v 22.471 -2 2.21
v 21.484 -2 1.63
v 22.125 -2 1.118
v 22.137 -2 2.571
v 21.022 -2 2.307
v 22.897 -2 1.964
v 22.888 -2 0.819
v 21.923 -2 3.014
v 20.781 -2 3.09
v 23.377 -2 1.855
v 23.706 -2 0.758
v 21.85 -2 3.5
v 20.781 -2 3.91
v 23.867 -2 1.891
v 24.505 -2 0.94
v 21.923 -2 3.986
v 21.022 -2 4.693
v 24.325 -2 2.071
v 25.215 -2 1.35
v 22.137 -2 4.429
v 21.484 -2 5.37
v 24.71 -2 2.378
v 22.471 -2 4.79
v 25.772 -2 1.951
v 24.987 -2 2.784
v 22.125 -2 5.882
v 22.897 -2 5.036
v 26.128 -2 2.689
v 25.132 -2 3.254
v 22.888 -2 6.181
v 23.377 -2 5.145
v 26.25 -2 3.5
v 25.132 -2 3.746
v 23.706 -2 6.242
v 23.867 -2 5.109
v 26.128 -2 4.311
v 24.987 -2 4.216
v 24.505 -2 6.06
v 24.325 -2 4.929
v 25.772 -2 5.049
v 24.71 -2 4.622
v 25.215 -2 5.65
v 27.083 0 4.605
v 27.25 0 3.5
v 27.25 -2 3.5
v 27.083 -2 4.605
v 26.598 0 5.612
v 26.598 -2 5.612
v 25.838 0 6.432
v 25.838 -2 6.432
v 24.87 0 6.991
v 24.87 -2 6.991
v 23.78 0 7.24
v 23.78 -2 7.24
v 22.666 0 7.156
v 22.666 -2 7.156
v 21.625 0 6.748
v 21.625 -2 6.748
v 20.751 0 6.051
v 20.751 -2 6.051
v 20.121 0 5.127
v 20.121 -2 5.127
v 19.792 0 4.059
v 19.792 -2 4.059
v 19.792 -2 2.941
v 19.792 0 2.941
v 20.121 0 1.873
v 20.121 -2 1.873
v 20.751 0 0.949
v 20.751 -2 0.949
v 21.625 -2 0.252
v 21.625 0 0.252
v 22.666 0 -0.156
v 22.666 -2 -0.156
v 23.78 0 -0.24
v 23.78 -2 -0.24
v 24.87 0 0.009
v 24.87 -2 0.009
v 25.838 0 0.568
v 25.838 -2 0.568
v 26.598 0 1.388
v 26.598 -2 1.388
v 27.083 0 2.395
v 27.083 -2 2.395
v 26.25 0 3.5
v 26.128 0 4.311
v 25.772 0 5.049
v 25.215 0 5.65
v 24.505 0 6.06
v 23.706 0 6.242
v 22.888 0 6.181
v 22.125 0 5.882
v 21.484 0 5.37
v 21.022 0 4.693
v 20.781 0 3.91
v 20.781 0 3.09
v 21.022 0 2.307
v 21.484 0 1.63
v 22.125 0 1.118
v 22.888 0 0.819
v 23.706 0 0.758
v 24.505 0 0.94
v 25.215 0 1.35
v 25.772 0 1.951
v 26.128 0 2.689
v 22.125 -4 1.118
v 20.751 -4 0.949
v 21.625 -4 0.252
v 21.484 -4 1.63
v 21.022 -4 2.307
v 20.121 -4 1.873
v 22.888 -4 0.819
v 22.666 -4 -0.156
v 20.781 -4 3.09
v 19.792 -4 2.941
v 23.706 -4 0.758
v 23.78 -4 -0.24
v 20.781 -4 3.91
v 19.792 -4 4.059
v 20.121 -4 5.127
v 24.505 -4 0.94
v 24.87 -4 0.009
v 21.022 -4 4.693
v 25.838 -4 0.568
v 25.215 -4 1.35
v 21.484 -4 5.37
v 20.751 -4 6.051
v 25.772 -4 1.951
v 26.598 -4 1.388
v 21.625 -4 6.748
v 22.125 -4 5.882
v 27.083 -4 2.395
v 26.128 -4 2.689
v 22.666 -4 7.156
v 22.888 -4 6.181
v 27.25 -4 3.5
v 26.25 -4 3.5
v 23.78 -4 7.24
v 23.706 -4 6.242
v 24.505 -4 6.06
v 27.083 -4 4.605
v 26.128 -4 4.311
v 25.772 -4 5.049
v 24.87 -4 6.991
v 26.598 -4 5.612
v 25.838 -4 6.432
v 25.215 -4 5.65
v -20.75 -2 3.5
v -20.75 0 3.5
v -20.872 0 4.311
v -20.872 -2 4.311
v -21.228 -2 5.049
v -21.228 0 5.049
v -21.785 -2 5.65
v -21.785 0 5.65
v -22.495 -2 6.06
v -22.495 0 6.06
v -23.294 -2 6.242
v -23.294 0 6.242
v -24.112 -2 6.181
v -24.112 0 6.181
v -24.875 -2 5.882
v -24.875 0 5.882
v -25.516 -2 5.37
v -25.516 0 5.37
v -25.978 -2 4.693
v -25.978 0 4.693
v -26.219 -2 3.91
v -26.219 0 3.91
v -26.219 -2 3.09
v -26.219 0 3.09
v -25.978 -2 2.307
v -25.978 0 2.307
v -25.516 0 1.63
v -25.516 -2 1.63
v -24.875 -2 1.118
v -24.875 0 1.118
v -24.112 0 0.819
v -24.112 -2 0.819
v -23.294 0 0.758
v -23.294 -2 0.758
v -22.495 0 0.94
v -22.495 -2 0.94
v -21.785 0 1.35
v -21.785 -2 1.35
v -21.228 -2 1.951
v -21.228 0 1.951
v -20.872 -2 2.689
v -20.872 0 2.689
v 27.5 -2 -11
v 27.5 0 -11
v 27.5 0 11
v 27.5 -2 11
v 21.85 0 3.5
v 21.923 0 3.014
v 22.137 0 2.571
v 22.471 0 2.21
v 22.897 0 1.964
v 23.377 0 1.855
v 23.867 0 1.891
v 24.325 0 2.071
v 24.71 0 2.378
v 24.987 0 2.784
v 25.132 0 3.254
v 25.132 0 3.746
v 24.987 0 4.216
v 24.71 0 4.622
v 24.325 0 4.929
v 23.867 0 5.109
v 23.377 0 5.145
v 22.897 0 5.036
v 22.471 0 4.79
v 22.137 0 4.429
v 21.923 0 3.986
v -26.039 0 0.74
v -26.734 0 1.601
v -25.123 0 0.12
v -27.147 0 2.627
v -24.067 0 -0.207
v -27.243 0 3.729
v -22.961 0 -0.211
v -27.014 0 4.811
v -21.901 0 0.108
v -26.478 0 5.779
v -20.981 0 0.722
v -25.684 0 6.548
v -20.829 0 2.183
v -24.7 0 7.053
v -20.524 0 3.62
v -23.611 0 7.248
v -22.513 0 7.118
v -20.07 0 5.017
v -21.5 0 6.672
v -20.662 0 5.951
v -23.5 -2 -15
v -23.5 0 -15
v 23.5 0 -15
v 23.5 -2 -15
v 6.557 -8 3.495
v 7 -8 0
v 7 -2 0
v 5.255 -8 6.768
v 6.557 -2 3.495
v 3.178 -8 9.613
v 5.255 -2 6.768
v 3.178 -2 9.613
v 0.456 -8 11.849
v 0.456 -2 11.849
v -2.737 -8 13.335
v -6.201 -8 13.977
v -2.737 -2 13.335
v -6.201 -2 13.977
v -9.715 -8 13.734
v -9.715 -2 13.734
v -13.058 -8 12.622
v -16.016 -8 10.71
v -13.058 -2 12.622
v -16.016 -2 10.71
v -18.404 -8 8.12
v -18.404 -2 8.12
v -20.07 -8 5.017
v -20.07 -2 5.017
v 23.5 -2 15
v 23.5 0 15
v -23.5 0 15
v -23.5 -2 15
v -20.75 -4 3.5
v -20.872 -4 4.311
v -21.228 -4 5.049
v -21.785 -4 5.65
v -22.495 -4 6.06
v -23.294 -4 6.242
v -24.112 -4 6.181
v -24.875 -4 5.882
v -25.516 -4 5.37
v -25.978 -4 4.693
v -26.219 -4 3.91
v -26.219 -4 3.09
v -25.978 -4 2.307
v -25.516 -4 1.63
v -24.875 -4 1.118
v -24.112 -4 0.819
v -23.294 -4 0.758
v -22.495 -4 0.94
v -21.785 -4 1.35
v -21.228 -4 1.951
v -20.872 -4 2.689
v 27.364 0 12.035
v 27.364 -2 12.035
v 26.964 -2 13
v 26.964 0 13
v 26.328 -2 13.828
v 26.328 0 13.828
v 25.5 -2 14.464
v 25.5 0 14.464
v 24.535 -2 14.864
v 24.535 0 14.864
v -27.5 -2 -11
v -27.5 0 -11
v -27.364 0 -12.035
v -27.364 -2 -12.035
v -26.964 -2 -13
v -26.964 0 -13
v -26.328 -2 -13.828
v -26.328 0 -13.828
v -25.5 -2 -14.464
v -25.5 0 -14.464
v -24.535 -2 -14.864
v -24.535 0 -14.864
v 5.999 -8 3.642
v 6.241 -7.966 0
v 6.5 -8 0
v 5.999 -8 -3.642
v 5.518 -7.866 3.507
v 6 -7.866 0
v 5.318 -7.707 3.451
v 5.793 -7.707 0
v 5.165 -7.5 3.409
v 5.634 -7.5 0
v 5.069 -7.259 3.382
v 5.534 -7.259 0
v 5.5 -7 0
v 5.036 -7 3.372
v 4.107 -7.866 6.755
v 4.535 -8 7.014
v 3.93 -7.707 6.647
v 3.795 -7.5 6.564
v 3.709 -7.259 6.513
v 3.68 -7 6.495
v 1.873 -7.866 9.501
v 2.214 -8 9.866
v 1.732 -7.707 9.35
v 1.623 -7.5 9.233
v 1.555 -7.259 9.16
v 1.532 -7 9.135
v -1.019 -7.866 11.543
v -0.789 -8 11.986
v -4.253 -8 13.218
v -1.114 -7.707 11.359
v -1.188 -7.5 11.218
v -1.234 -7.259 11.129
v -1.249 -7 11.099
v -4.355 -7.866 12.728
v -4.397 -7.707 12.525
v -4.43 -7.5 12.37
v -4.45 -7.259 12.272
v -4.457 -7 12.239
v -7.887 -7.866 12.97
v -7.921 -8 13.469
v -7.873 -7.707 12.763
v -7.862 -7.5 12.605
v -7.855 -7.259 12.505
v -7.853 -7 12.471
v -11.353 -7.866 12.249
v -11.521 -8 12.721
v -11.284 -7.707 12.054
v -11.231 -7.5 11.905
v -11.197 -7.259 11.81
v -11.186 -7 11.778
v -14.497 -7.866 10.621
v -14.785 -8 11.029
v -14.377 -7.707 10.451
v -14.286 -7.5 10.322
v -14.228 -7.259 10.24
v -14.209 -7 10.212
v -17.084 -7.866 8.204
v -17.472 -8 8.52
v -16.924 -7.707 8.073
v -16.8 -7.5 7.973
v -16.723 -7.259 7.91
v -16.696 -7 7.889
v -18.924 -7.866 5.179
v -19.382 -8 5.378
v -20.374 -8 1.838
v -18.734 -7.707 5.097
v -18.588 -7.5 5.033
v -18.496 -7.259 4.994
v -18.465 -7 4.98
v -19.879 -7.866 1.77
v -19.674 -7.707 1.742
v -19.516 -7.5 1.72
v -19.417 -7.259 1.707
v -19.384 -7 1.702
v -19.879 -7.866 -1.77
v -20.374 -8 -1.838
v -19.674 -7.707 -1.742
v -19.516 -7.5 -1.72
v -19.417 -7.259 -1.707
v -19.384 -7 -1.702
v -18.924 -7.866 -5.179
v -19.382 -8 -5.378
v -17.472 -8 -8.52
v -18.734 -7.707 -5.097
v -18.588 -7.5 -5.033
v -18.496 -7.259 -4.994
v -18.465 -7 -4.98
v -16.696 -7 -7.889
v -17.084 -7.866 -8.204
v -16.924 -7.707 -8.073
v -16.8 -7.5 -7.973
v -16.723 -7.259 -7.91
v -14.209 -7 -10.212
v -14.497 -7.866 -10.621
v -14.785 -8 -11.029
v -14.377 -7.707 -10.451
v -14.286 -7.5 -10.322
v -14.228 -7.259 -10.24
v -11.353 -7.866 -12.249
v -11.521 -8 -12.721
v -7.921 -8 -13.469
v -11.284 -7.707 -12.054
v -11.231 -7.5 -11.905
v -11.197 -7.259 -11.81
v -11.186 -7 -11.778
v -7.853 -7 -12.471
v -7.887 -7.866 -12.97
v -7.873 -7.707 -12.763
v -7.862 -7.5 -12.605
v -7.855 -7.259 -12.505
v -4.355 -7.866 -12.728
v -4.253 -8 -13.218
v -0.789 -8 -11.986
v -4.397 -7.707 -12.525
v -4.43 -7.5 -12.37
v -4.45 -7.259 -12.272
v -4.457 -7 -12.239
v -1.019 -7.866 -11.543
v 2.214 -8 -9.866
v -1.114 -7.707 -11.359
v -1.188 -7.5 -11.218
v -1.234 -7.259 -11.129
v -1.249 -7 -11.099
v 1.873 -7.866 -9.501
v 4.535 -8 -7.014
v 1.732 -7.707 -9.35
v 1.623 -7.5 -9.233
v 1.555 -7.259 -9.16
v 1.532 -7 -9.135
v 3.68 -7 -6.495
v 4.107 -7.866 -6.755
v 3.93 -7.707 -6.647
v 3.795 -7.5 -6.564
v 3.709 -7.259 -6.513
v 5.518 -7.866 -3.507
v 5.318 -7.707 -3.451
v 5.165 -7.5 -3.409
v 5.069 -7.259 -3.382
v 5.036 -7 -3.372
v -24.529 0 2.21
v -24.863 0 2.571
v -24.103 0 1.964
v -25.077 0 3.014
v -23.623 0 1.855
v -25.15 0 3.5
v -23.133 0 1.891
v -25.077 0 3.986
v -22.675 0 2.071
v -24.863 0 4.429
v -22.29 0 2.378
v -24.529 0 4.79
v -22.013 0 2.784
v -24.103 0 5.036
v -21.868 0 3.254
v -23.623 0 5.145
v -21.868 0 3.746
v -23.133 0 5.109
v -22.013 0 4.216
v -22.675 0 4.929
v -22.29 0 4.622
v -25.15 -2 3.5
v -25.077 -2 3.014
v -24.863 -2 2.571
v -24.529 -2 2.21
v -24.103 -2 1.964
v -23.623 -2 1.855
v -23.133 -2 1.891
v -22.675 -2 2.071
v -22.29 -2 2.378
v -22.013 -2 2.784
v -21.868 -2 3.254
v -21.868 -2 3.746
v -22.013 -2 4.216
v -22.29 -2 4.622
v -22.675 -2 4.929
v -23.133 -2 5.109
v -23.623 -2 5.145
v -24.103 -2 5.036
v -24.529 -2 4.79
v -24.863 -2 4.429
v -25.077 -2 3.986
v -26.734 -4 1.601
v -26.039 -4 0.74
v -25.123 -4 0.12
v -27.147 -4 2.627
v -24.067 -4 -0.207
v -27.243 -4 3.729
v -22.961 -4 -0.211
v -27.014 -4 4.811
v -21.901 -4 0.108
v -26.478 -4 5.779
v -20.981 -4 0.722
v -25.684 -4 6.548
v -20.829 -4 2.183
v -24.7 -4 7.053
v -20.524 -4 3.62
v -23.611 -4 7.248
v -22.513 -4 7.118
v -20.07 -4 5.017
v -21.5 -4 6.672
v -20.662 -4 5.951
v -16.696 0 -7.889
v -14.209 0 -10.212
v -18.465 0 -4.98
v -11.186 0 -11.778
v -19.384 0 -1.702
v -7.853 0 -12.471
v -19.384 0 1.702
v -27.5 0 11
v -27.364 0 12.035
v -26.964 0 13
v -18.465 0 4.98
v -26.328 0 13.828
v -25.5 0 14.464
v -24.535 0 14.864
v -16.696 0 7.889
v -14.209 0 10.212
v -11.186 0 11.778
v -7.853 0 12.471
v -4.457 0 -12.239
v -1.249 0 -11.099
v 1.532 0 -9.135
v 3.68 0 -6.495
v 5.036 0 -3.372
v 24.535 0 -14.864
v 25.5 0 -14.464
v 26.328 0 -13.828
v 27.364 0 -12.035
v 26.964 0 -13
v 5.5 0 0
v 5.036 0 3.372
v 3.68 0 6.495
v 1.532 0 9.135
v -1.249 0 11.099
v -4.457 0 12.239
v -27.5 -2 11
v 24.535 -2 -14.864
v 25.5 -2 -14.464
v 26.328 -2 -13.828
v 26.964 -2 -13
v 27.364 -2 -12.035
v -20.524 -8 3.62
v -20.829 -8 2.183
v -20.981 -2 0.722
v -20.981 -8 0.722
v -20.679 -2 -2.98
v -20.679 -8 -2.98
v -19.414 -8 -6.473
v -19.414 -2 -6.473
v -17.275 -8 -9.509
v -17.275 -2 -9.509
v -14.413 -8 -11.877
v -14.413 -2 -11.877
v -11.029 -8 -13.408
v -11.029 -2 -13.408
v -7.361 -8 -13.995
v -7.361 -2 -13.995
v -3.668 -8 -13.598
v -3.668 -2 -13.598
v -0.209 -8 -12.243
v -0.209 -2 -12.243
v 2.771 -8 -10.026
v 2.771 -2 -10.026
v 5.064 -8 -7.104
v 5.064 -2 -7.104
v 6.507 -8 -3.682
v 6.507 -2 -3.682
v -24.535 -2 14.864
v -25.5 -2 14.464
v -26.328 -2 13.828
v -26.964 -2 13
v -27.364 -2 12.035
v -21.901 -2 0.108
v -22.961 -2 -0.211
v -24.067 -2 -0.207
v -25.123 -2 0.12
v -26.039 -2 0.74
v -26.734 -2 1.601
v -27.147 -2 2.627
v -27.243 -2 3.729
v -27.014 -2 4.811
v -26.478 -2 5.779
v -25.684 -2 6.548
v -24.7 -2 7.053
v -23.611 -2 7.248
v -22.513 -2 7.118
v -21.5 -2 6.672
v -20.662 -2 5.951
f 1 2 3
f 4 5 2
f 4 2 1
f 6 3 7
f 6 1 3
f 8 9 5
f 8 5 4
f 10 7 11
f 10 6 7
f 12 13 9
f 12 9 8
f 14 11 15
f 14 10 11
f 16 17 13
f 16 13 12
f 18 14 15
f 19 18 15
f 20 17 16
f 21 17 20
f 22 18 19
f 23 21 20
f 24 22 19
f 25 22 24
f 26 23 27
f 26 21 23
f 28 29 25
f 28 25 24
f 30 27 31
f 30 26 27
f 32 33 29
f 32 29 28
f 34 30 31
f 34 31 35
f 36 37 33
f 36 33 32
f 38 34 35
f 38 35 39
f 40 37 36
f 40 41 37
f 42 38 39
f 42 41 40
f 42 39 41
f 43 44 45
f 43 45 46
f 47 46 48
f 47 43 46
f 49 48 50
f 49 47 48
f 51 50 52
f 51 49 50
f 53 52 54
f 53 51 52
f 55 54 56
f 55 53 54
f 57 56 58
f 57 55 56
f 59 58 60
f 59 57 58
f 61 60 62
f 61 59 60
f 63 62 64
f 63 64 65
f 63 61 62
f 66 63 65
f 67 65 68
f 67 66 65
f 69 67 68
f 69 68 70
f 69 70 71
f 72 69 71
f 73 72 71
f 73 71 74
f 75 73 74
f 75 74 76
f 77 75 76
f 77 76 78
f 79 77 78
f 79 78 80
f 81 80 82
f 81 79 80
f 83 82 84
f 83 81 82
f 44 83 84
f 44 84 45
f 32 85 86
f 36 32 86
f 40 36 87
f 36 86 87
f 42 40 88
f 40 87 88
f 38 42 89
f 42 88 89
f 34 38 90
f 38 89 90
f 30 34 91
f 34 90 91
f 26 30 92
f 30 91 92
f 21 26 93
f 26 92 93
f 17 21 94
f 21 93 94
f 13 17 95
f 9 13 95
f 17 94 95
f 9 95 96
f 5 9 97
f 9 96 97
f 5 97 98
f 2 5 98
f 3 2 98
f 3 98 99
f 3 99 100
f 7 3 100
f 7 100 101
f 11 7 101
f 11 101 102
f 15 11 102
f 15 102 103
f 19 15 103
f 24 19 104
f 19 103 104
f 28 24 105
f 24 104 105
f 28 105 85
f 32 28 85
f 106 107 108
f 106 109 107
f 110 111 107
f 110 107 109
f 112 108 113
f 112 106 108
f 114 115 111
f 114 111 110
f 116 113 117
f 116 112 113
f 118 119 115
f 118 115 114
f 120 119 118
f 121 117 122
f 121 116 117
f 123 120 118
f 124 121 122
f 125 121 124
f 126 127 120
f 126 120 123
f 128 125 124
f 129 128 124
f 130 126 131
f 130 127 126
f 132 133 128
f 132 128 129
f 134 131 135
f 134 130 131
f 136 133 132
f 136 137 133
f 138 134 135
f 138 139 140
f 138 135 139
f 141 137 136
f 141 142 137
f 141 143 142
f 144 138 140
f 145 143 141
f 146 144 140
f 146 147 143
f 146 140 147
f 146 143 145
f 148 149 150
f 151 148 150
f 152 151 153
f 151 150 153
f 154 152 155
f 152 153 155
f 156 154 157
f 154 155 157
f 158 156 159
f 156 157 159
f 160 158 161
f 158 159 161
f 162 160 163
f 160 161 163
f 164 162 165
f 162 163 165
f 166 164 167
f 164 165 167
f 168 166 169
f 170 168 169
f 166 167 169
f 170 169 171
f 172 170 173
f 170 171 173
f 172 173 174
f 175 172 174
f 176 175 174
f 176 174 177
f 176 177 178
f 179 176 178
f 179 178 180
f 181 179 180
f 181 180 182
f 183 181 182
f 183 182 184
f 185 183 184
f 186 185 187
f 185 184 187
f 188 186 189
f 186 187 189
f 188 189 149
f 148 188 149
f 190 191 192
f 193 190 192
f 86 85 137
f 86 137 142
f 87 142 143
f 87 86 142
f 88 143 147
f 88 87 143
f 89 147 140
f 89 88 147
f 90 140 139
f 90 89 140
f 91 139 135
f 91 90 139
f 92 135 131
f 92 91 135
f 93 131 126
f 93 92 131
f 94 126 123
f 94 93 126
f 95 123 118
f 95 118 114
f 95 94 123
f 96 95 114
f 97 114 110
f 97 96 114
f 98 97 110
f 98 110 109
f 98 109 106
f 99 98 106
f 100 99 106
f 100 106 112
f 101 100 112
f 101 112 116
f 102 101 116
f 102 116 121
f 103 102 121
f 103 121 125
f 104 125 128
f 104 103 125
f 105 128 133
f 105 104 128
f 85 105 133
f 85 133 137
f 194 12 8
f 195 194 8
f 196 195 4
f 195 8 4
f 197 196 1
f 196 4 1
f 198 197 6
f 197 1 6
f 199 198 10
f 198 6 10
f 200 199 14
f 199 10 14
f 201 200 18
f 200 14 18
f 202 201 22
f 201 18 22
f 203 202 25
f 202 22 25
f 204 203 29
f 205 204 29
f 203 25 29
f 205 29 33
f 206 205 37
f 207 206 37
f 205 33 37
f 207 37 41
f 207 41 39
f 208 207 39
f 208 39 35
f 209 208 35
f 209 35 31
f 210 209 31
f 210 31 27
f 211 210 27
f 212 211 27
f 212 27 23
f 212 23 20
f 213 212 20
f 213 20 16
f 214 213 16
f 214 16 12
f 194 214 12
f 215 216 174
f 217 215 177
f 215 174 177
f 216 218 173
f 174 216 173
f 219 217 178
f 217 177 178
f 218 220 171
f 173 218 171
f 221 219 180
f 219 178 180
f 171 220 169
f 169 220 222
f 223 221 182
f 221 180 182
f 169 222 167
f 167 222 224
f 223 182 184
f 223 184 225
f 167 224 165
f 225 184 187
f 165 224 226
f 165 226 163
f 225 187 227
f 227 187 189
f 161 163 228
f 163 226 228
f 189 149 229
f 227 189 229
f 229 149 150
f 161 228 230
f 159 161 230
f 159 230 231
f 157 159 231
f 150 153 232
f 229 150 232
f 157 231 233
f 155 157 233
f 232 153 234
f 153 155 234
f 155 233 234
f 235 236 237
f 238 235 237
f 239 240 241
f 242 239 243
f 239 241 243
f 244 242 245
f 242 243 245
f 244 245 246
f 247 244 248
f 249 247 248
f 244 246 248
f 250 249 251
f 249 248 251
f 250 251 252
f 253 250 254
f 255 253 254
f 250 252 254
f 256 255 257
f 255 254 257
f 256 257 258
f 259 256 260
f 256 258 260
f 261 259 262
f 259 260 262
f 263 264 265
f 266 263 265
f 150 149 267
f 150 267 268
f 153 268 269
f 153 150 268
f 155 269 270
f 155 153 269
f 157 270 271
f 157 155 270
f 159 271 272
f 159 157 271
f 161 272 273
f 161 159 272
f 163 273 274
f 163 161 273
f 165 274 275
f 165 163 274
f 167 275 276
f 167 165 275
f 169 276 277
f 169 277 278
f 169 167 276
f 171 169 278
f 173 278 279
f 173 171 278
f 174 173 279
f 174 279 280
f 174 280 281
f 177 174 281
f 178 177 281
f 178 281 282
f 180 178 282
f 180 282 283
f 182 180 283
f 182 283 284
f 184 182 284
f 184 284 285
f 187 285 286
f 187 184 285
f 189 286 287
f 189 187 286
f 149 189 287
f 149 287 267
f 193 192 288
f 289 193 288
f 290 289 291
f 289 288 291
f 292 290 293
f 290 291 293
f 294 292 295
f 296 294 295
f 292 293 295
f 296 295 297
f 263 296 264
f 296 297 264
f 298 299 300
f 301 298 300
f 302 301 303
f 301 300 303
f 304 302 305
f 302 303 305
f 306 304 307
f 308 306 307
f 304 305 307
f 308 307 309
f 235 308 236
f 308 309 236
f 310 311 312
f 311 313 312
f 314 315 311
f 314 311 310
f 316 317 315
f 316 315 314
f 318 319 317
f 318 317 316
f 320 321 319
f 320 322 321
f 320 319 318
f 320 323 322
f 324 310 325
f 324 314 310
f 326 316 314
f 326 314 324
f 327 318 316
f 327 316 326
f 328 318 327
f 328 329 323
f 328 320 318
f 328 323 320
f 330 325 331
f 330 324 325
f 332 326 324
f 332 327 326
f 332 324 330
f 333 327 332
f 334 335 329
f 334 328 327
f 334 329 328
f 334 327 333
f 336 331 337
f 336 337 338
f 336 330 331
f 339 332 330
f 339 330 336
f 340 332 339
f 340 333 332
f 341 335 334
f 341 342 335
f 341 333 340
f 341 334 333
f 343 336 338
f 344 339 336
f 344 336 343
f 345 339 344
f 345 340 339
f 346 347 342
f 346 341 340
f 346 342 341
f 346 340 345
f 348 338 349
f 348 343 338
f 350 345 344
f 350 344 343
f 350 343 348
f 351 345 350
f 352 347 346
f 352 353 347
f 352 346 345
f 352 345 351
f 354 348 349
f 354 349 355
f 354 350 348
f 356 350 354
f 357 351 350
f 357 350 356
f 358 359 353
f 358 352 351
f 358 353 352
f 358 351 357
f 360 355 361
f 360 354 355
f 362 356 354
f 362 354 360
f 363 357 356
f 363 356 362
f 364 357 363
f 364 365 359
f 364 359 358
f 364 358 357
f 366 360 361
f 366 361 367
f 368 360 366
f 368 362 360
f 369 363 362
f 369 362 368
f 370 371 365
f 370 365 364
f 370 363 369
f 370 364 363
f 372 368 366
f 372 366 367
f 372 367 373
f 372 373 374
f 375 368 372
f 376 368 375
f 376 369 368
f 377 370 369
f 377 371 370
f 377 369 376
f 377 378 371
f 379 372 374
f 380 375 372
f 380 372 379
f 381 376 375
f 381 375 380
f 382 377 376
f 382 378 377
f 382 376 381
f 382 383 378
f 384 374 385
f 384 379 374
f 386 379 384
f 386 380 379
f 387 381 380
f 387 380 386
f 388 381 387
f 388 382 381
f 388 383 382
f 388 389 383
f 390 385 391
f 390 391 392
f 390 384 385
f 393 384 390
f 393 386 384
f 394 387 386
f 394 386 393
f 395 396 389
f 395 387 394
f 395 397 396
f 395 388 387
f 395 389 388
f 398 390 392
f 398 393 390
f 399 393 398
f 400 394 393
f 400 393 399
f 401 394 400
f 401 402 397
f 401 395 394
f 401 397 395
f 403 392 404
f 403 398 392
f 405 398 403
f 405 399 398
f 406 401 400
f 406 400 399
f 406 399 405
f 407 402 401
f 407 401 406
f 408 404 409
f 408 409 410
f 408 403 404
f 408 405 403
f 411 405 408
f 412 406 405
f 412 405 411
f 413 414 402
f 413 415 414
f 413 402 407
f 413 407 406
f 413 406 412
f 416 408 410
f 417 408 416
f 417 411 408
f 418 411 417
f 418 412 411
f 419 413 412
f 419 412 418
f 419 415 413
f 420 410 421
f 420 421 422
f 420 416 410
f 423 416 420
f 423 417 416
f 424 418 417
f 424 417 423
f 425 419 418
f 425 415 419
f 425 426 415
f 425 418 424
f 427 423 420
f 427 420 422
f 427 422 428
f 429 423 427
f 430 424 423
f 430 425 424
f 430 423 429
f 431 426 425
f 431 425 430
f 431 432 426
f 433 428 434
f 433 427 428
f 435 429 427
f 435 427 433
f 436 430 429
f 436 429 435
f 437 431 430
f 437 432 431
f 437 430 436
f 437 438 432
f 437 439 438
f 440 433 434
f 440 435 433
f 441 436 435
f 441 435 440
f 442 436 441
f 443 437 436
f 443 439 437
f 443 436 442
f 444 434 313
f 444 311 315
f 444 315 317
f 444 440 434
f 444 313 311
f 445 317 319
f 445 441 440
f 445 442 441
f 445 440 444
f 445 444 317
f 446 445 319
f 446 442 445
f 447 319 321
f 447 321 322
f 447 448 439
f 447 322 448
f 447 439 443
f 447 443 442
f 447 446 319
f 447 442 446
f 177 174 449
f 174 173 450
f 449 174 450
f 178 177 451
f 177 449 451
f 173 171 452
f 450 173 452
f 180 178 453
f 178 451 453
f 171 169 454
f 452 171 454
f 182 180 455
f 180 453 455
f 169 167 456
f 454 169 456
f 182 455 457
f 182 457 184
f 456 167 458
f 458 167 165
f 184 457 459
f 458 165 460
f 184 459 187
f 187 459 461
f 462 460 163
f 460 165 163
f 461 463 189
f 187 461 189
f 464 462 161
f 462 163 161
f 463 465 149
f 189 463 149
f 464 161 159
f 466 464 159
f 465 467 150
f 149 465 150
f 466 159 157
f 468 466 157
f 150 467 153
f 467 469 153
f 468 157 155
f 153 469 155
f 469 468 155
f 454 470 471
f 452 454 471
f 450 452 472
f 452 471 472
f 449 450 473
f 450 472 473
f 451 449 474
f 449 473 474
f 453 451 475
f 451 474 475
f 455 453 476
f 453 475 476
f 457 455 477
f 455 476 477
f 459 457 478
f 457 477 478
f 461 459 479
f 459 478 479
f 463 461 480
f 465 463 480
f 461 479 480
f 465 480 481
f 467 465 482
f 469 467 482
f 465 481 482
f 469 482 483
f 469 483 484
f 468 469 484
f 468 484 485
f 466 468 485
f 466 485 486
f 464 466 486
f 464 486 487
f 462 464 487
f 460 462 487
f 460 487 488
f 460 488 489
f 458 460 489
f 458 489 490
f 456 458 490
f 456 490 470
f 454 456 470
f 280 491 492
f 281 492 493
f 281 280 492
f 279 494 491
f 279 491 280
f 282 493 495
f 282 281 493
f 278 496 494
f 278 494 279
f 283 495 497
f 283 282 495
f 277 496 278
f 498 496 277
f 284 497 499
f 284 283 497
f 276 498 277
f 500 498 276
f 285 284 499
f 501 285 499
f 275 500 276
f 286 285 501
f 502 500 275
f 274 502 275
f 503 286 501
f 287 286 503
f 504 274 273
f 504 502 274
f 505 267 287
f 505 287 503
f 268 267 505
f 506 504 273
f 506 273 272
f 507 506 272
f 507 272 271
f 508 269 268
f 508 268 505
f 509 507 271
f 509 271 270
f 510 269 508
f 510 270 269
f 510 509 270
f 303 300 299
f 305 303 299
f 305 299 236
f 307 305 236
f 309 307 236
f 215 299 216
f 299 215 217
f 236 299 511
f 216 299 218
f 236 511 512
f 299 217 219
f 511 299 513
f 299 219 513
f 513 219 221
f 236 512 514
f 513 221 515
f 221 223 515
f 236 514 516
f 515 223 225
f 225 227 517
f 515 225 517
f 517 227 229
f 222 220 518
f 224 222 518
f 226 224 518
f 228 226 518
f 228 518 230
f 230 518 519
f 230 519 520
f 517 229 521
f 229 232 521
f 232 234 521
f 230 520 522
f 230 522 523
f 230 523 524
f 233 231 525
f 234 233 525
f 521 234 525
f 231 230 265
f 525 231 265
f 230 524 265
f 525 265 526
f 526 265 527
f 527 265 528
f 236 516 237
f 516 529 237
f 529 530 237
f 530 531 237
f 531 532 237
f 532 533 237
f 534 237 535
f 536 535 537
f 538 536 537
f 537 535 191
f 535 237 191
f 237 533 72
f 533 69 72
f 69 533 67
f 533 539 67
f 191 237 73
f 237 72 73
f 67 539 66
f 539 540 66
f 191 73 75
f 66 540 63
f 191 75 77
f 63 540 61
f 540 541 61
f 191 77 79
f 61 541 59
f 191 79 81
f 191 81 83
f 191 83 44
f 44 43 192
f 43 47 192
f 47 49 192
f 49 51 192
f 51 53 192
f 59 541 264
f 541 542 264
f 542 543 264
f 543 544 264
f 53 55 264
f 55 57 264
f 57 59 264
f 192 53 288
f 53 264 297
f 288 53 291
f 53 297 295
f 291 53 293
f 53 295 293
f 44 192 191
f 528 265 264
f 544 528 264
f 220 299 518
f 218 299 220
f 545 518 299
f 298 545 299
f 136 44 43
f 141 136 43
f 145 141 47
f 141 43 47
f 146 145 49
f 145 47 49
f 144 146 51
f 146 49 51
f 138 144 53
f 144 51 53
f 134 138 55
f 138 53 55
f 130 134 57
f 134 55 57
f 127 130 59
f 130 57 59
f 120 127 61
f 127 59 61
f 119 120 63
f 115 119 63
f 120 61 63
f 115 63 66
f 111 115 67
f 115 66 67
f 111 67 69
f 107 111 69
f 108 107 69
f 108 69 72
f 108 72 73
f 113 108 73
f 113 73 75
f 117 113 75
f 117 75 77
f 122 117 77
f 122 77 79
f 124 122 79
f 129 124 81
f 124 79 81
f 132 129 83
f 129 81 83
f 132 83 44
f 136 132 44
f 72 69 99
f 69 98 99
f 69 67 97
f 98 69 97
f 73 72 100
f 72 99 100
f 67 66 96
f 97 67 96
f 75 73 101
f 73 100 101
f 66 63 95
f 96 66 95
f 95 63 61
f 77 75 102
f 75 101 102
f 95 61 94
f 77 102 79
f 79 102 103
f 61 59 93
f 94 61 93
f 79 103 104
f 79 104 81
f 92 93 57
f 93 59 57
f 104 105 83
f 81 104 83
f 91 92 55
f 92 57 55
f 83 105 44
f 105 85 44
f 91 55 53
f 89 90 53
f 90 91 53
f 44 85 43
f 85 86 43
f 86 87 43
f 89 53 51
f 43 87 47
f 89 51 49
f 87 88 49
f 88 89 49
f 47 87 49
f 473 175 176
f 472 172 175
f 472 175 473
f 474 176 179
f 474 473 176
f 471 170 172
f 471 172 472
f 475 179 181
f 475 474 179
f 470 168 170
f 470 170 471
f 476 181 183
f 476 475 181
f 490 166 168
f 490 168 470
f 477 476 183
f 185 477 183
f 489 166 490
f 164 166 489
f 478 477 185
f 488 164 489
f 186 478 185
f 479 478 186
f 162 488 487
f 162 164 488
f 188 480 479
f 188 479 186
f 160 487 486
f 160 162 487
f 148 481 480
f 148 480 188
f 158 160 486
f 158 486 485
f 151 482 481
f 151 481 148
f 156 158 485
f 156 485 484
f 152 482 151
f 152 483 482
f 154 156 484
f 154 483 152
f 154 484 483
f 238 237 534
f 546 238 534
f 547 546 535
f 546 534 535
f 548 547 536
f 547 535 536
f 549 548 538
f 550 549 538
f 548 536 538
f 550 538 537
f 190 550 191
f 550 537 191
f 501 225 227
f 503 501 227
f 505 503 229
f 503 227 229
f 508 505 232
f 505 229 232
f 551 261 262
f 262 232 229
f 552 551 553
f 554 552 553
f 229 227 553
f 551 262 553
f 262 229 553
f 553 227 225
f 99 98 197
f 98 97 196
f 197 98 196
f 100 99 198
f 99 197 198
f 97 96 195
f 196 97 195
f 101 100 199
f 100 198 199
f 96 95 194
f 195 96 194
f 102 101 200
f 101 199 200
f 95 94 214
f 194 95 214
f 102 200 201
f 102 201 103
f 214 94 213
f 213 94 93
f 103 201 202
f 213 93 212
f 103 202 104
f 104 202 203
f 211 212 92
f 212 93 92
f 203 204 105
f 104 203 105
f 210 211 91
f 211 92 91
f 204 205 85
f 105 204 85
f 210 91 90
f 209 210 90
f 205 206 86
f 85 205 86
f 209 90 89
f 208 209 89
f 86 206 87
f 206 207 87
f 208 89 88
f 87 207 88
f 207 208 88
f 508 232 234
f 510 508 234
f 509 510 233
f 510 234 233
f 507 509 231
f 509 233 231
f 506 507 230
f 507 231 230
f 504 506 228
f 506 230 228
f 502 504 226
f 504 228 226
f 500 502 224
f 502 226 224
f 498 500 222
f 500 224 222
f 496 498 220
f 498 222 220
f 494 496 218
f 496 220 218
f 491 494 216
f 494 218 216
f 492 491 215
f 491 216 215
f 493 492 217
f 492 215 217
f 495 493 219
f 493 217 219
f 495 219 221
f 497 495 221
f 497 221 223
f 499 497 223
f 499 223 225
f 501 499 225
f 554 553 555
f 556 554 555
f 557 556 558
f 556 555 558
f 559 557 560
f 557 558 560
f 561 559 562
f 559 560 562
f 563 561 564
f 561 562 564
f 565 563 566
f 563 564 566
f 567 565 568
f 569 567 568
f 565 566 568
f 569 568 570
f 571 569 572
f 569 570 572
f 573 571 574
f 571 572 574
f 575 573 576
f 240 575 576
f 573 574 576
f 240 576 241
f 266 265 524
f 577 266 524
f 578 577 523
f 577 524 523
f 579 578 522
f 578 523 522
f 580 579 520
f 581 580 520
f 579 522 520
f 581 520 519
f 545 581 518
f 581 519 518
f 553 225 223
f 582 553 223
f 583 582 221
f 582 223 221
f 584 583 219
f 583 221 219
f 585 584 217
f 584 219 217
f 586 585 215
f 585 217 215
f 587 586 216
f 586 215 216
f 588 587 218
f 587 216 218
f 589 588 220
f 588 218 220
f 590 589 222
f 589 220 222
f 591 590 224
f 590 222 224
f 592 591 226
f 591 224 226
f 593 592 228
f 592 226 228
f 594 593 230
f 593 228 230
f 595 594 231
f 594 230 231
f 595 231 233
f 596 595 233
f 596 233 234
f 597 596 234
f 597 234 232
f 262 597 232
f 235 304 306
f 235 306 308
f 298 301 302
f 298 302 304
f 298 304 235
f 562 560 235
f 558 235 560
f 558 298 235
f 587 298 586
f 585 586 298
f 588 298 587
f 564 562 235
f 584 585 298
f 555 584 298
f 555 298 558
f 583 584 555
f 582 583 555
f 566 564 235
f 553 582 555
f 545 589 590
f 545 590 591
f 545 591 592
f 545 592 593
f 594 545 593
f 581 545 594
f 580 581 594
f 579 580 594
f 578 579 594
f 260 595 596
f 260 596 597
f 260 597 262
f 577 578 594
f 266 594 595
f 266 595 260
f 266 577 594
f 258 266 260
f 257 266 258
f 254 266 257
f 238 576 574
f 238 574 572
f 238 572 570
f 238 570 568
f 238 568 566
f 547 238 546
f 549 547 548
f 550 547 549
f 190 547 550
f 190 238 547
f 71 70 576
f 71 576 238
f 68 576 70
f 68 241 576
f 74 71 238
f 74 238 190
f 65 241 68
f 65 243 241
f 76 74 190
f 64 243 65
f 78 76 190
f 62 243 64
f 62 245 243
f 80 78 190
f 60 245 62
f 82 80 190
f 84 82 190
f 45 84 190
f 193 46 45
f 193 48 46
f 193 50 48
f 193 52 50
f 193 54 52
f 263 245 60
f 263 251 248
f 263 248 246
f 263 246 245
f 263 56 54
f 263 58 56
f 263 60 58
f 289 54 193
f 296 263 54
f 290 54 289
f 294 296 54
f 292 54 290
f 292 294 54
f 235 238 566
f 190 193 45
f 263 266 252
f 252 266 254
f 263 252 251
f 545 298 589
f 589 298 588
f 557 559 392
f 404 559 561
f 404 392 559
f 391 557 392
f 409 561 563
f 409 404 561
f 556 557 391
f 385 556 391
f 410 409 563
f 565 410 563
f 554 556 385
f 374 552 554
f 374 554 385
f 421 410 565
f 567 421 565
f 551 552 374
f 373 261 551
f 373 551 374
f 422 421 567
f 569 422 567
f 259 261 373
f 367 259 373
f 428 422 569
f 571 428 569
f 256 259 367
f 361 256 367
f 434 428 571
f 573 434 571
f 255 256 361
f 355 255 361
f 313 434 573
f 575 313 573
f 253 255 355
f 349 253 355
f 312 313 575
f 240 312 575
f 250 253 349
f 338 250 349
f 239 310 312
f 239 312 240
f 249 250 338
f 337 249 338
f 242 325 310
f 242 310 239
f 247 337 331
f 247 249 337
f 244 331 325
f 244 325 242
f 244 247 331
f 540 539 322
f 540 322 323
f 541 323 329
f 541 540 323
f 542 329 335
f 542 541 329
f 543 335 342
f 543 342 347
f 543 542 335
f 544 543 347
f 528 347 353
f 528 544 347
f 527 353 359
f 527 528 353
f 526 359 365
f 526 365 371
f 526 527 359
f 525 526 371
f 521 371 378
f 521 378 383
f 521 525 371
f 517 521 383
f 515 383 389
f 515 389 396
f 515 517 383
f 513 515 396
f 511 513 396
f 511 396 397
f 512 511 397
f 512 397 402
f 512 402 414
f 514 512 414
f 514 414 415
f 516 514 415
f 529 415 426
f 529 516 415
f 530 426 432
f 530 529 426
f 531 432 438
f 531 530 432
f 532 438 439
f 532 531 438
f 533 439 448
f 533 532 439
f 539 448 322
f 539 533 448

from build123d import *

# Parameters (mm, degrees)
F0_R       = 3.75
F1_DEPTH   = 2
F0_R_2     = 2.75
F0_R_3     = 12.5
F2_DEPTH   = 8
F3_DEPTH   = 4
F4_R       = 1
F5_D       = 3.3
F5_DEPTH   = 7.9
F5_TIP     = 0.9914200214
F5_2_D     = 3.3
F5_2_DEPTH = 7.9
F5_2_TIP   = 0.9914200214


with BuildPart() as f1:
    # F0 (on Front) → F1 (new body)
    with BuildSketch(Plane.XZ):
        with BuildLine():
            Line((-23.5, -15), (23.5, -15))
            ThreePointArc((23.5, -15), (26.3284271247, -13.8284271247), (27.5, -11))
            Line((27.5, -11), (27.5, 11))
            ThreePointArc((27.5, 11), (26.3284271247, 13.8284271247), (23.5, 15))
            Line((23.5, 15), (-23.5, 15))
            ThreePointArc((-23.5, 15), (-26.3284271247, 13.8284271247), (-27.5, 11))
            Line((-27.5, 11), (-27.5, -11))
            ThreePointArc((-27.5, -11), (-26.3284271247, -13.8284271247), (-23.5, -15))
        make_face()
        with BuildLine():
            ThreePointArc((-20.0703484099, 5.0165717821), (-4.4490078144, 13.7656252626), (7, 0))
            ThreePointArc((7, 0), (-7.3609575638, -13.9953459992), (-20.981387091, 0.7216751423))
            ThreePointArc((-20.981387091, 0.7216751423), (-27.1683779691, 4.2781407813), (-20.0703484099, 5.0165717821))
        make_face(mode=Mode.SUBTRACT)
        with Locations((23.5, 3.5)):
            Circle(F0_R, mode=Mode.SUBTRACT)
    extrude(amount=F1_DEPTH)

    # F0 (on Front) → F2 (join)
    with BuildSketch(Plane.XZ):
        with BuildLine():
            ThreePointArc((-20.981387091, 0.7216751423), (-7.3609575638, -13.9953459992), (7, 0))
            ThreePointArc((7, 0), (-4.4490078144, 13.7656252626), (-20.0703484099, 5.0165717821))
            ThreePointArc((-20.0703484099, 5.0165717821), (-19.8309610616, 4.2750182375), (-19.75, 3.5))
            ThreePointArc((-19.75, 3.5), (-20.07164045, 1.9805096921), (-20.981387091, 0.7216751423))
        make_face()
        with Locations((-7, 0)):
            Circle(F0_R_3, mode=Mode.SUBTRACT)
        with BuildLine():
            ThreePointArc((-19.75, 3.5), (-19.8309610616, 4.2750182375), (-20.0703484099, 5.0165717821))
            ThreePointArc((-20.0703484099, 5.0165717821), (-20.6952777514, 2.905058917), (-20.981387091, 0.7216751423))
            ThreePointArc((-20.981387091, 0.7216751423), (-20.07164045, 1.9805096921), (-19.75, 3.5))
        make_face()
    extrude(amount=F2_DEPTH)

    # F4
    f4_edges = [f1.edges().sort_by_distance(p)[0] for p in [
        (-19.5, -8, 0),
    ]]
    fillet(f4_edges, radius=F4_R)


with BuildPart() as f1b:
    # F0 (on Front) → F1, piece 2 (new body)
    with BuildSketch(Plane.XZ):
        with Locations((-23.5, 3.5)):
            Circle(F0_R_2)
    extrude(amount=F1_DEPTH)

    # F5
    with Locations(Plane(origin=(0, 0, 0), x_dir=(1, 0, 0), z_dir=(0, 1, 0))):
        with Locations((-23.5, -3.5), (23.5, -3.5)):
            Hole(F5_D / 2, depth=F5_DEPTH)
            with Locations((0, 0, -(F5_DEPTH + F5_TIP / 2))):  # 118° drill point
                Cone(0, F5_D / 2, F5_TIP, mode=Mode.SUBTRACT)


with BuildPart() as f1c:
    # F0 (on Front) → F1, piece 3 (new body)
    with BuildSketch(Plane.XZ):
        with Locations((23.5, 3.5)):
            Circle(F0_R_2)
    extrude(amount=F1_DEPTH)

    # F5#2
    with Locations(Plane(origin=(0, 0, 0), x_dir=(1, 0, 0), z_dir=(0, 1, 0))):
        with Locations((-23.5, -3.5), (23.5, -3.5)):
            Hole(F5_2_D / 2, depth=F5_2_DEPTH)
            with Locations((0, 0, -(F5_2_DEPTH + F5_2_TIP / 2))):  # 118° drill point
                Cone(0, F5_2_D / 2, F5_2_TIP, mode=Mode.SUBTRACT)


with BuildPart() as f3:
    # F0 (on Front) → F3 (new body)
    with BuildSketch(Plane.XZ):
        with BuildLine():
            ThreePointArc((-20.981387091, 0.7216751423), (-20.6952777514, 2.905058917), (-20.0703484099, 5.0165717821))
            ThreePointArc((-20.0703484099, 5.0165717821), (-27.1683779691, 4.2781407813), (-20.981387091, 0.7216751423))
        make_face()
        with Locations((-23.5, 3.5)):
            Circle(F0_R_2, mode=Mode.SUBTRACT)
    extrude(amount=F3_DEPTH)


with BuildPart() as f3b:
    # F0 (on Front) → F3, piece 2 (new body)
    with BuildSketch(Plane.XZ):
        with Locations((23.5, 3.5)):
            Circle(F0_R)
        with Locations((23.5, 3.5)):
            Circle(F0_R_2, mode=Mode.SUBTRACT)
    extrude(amount=F3_DEPTH)


solid = Compound([f1.part, f1b.part, f1c.part, f3.part, f3b.part])
